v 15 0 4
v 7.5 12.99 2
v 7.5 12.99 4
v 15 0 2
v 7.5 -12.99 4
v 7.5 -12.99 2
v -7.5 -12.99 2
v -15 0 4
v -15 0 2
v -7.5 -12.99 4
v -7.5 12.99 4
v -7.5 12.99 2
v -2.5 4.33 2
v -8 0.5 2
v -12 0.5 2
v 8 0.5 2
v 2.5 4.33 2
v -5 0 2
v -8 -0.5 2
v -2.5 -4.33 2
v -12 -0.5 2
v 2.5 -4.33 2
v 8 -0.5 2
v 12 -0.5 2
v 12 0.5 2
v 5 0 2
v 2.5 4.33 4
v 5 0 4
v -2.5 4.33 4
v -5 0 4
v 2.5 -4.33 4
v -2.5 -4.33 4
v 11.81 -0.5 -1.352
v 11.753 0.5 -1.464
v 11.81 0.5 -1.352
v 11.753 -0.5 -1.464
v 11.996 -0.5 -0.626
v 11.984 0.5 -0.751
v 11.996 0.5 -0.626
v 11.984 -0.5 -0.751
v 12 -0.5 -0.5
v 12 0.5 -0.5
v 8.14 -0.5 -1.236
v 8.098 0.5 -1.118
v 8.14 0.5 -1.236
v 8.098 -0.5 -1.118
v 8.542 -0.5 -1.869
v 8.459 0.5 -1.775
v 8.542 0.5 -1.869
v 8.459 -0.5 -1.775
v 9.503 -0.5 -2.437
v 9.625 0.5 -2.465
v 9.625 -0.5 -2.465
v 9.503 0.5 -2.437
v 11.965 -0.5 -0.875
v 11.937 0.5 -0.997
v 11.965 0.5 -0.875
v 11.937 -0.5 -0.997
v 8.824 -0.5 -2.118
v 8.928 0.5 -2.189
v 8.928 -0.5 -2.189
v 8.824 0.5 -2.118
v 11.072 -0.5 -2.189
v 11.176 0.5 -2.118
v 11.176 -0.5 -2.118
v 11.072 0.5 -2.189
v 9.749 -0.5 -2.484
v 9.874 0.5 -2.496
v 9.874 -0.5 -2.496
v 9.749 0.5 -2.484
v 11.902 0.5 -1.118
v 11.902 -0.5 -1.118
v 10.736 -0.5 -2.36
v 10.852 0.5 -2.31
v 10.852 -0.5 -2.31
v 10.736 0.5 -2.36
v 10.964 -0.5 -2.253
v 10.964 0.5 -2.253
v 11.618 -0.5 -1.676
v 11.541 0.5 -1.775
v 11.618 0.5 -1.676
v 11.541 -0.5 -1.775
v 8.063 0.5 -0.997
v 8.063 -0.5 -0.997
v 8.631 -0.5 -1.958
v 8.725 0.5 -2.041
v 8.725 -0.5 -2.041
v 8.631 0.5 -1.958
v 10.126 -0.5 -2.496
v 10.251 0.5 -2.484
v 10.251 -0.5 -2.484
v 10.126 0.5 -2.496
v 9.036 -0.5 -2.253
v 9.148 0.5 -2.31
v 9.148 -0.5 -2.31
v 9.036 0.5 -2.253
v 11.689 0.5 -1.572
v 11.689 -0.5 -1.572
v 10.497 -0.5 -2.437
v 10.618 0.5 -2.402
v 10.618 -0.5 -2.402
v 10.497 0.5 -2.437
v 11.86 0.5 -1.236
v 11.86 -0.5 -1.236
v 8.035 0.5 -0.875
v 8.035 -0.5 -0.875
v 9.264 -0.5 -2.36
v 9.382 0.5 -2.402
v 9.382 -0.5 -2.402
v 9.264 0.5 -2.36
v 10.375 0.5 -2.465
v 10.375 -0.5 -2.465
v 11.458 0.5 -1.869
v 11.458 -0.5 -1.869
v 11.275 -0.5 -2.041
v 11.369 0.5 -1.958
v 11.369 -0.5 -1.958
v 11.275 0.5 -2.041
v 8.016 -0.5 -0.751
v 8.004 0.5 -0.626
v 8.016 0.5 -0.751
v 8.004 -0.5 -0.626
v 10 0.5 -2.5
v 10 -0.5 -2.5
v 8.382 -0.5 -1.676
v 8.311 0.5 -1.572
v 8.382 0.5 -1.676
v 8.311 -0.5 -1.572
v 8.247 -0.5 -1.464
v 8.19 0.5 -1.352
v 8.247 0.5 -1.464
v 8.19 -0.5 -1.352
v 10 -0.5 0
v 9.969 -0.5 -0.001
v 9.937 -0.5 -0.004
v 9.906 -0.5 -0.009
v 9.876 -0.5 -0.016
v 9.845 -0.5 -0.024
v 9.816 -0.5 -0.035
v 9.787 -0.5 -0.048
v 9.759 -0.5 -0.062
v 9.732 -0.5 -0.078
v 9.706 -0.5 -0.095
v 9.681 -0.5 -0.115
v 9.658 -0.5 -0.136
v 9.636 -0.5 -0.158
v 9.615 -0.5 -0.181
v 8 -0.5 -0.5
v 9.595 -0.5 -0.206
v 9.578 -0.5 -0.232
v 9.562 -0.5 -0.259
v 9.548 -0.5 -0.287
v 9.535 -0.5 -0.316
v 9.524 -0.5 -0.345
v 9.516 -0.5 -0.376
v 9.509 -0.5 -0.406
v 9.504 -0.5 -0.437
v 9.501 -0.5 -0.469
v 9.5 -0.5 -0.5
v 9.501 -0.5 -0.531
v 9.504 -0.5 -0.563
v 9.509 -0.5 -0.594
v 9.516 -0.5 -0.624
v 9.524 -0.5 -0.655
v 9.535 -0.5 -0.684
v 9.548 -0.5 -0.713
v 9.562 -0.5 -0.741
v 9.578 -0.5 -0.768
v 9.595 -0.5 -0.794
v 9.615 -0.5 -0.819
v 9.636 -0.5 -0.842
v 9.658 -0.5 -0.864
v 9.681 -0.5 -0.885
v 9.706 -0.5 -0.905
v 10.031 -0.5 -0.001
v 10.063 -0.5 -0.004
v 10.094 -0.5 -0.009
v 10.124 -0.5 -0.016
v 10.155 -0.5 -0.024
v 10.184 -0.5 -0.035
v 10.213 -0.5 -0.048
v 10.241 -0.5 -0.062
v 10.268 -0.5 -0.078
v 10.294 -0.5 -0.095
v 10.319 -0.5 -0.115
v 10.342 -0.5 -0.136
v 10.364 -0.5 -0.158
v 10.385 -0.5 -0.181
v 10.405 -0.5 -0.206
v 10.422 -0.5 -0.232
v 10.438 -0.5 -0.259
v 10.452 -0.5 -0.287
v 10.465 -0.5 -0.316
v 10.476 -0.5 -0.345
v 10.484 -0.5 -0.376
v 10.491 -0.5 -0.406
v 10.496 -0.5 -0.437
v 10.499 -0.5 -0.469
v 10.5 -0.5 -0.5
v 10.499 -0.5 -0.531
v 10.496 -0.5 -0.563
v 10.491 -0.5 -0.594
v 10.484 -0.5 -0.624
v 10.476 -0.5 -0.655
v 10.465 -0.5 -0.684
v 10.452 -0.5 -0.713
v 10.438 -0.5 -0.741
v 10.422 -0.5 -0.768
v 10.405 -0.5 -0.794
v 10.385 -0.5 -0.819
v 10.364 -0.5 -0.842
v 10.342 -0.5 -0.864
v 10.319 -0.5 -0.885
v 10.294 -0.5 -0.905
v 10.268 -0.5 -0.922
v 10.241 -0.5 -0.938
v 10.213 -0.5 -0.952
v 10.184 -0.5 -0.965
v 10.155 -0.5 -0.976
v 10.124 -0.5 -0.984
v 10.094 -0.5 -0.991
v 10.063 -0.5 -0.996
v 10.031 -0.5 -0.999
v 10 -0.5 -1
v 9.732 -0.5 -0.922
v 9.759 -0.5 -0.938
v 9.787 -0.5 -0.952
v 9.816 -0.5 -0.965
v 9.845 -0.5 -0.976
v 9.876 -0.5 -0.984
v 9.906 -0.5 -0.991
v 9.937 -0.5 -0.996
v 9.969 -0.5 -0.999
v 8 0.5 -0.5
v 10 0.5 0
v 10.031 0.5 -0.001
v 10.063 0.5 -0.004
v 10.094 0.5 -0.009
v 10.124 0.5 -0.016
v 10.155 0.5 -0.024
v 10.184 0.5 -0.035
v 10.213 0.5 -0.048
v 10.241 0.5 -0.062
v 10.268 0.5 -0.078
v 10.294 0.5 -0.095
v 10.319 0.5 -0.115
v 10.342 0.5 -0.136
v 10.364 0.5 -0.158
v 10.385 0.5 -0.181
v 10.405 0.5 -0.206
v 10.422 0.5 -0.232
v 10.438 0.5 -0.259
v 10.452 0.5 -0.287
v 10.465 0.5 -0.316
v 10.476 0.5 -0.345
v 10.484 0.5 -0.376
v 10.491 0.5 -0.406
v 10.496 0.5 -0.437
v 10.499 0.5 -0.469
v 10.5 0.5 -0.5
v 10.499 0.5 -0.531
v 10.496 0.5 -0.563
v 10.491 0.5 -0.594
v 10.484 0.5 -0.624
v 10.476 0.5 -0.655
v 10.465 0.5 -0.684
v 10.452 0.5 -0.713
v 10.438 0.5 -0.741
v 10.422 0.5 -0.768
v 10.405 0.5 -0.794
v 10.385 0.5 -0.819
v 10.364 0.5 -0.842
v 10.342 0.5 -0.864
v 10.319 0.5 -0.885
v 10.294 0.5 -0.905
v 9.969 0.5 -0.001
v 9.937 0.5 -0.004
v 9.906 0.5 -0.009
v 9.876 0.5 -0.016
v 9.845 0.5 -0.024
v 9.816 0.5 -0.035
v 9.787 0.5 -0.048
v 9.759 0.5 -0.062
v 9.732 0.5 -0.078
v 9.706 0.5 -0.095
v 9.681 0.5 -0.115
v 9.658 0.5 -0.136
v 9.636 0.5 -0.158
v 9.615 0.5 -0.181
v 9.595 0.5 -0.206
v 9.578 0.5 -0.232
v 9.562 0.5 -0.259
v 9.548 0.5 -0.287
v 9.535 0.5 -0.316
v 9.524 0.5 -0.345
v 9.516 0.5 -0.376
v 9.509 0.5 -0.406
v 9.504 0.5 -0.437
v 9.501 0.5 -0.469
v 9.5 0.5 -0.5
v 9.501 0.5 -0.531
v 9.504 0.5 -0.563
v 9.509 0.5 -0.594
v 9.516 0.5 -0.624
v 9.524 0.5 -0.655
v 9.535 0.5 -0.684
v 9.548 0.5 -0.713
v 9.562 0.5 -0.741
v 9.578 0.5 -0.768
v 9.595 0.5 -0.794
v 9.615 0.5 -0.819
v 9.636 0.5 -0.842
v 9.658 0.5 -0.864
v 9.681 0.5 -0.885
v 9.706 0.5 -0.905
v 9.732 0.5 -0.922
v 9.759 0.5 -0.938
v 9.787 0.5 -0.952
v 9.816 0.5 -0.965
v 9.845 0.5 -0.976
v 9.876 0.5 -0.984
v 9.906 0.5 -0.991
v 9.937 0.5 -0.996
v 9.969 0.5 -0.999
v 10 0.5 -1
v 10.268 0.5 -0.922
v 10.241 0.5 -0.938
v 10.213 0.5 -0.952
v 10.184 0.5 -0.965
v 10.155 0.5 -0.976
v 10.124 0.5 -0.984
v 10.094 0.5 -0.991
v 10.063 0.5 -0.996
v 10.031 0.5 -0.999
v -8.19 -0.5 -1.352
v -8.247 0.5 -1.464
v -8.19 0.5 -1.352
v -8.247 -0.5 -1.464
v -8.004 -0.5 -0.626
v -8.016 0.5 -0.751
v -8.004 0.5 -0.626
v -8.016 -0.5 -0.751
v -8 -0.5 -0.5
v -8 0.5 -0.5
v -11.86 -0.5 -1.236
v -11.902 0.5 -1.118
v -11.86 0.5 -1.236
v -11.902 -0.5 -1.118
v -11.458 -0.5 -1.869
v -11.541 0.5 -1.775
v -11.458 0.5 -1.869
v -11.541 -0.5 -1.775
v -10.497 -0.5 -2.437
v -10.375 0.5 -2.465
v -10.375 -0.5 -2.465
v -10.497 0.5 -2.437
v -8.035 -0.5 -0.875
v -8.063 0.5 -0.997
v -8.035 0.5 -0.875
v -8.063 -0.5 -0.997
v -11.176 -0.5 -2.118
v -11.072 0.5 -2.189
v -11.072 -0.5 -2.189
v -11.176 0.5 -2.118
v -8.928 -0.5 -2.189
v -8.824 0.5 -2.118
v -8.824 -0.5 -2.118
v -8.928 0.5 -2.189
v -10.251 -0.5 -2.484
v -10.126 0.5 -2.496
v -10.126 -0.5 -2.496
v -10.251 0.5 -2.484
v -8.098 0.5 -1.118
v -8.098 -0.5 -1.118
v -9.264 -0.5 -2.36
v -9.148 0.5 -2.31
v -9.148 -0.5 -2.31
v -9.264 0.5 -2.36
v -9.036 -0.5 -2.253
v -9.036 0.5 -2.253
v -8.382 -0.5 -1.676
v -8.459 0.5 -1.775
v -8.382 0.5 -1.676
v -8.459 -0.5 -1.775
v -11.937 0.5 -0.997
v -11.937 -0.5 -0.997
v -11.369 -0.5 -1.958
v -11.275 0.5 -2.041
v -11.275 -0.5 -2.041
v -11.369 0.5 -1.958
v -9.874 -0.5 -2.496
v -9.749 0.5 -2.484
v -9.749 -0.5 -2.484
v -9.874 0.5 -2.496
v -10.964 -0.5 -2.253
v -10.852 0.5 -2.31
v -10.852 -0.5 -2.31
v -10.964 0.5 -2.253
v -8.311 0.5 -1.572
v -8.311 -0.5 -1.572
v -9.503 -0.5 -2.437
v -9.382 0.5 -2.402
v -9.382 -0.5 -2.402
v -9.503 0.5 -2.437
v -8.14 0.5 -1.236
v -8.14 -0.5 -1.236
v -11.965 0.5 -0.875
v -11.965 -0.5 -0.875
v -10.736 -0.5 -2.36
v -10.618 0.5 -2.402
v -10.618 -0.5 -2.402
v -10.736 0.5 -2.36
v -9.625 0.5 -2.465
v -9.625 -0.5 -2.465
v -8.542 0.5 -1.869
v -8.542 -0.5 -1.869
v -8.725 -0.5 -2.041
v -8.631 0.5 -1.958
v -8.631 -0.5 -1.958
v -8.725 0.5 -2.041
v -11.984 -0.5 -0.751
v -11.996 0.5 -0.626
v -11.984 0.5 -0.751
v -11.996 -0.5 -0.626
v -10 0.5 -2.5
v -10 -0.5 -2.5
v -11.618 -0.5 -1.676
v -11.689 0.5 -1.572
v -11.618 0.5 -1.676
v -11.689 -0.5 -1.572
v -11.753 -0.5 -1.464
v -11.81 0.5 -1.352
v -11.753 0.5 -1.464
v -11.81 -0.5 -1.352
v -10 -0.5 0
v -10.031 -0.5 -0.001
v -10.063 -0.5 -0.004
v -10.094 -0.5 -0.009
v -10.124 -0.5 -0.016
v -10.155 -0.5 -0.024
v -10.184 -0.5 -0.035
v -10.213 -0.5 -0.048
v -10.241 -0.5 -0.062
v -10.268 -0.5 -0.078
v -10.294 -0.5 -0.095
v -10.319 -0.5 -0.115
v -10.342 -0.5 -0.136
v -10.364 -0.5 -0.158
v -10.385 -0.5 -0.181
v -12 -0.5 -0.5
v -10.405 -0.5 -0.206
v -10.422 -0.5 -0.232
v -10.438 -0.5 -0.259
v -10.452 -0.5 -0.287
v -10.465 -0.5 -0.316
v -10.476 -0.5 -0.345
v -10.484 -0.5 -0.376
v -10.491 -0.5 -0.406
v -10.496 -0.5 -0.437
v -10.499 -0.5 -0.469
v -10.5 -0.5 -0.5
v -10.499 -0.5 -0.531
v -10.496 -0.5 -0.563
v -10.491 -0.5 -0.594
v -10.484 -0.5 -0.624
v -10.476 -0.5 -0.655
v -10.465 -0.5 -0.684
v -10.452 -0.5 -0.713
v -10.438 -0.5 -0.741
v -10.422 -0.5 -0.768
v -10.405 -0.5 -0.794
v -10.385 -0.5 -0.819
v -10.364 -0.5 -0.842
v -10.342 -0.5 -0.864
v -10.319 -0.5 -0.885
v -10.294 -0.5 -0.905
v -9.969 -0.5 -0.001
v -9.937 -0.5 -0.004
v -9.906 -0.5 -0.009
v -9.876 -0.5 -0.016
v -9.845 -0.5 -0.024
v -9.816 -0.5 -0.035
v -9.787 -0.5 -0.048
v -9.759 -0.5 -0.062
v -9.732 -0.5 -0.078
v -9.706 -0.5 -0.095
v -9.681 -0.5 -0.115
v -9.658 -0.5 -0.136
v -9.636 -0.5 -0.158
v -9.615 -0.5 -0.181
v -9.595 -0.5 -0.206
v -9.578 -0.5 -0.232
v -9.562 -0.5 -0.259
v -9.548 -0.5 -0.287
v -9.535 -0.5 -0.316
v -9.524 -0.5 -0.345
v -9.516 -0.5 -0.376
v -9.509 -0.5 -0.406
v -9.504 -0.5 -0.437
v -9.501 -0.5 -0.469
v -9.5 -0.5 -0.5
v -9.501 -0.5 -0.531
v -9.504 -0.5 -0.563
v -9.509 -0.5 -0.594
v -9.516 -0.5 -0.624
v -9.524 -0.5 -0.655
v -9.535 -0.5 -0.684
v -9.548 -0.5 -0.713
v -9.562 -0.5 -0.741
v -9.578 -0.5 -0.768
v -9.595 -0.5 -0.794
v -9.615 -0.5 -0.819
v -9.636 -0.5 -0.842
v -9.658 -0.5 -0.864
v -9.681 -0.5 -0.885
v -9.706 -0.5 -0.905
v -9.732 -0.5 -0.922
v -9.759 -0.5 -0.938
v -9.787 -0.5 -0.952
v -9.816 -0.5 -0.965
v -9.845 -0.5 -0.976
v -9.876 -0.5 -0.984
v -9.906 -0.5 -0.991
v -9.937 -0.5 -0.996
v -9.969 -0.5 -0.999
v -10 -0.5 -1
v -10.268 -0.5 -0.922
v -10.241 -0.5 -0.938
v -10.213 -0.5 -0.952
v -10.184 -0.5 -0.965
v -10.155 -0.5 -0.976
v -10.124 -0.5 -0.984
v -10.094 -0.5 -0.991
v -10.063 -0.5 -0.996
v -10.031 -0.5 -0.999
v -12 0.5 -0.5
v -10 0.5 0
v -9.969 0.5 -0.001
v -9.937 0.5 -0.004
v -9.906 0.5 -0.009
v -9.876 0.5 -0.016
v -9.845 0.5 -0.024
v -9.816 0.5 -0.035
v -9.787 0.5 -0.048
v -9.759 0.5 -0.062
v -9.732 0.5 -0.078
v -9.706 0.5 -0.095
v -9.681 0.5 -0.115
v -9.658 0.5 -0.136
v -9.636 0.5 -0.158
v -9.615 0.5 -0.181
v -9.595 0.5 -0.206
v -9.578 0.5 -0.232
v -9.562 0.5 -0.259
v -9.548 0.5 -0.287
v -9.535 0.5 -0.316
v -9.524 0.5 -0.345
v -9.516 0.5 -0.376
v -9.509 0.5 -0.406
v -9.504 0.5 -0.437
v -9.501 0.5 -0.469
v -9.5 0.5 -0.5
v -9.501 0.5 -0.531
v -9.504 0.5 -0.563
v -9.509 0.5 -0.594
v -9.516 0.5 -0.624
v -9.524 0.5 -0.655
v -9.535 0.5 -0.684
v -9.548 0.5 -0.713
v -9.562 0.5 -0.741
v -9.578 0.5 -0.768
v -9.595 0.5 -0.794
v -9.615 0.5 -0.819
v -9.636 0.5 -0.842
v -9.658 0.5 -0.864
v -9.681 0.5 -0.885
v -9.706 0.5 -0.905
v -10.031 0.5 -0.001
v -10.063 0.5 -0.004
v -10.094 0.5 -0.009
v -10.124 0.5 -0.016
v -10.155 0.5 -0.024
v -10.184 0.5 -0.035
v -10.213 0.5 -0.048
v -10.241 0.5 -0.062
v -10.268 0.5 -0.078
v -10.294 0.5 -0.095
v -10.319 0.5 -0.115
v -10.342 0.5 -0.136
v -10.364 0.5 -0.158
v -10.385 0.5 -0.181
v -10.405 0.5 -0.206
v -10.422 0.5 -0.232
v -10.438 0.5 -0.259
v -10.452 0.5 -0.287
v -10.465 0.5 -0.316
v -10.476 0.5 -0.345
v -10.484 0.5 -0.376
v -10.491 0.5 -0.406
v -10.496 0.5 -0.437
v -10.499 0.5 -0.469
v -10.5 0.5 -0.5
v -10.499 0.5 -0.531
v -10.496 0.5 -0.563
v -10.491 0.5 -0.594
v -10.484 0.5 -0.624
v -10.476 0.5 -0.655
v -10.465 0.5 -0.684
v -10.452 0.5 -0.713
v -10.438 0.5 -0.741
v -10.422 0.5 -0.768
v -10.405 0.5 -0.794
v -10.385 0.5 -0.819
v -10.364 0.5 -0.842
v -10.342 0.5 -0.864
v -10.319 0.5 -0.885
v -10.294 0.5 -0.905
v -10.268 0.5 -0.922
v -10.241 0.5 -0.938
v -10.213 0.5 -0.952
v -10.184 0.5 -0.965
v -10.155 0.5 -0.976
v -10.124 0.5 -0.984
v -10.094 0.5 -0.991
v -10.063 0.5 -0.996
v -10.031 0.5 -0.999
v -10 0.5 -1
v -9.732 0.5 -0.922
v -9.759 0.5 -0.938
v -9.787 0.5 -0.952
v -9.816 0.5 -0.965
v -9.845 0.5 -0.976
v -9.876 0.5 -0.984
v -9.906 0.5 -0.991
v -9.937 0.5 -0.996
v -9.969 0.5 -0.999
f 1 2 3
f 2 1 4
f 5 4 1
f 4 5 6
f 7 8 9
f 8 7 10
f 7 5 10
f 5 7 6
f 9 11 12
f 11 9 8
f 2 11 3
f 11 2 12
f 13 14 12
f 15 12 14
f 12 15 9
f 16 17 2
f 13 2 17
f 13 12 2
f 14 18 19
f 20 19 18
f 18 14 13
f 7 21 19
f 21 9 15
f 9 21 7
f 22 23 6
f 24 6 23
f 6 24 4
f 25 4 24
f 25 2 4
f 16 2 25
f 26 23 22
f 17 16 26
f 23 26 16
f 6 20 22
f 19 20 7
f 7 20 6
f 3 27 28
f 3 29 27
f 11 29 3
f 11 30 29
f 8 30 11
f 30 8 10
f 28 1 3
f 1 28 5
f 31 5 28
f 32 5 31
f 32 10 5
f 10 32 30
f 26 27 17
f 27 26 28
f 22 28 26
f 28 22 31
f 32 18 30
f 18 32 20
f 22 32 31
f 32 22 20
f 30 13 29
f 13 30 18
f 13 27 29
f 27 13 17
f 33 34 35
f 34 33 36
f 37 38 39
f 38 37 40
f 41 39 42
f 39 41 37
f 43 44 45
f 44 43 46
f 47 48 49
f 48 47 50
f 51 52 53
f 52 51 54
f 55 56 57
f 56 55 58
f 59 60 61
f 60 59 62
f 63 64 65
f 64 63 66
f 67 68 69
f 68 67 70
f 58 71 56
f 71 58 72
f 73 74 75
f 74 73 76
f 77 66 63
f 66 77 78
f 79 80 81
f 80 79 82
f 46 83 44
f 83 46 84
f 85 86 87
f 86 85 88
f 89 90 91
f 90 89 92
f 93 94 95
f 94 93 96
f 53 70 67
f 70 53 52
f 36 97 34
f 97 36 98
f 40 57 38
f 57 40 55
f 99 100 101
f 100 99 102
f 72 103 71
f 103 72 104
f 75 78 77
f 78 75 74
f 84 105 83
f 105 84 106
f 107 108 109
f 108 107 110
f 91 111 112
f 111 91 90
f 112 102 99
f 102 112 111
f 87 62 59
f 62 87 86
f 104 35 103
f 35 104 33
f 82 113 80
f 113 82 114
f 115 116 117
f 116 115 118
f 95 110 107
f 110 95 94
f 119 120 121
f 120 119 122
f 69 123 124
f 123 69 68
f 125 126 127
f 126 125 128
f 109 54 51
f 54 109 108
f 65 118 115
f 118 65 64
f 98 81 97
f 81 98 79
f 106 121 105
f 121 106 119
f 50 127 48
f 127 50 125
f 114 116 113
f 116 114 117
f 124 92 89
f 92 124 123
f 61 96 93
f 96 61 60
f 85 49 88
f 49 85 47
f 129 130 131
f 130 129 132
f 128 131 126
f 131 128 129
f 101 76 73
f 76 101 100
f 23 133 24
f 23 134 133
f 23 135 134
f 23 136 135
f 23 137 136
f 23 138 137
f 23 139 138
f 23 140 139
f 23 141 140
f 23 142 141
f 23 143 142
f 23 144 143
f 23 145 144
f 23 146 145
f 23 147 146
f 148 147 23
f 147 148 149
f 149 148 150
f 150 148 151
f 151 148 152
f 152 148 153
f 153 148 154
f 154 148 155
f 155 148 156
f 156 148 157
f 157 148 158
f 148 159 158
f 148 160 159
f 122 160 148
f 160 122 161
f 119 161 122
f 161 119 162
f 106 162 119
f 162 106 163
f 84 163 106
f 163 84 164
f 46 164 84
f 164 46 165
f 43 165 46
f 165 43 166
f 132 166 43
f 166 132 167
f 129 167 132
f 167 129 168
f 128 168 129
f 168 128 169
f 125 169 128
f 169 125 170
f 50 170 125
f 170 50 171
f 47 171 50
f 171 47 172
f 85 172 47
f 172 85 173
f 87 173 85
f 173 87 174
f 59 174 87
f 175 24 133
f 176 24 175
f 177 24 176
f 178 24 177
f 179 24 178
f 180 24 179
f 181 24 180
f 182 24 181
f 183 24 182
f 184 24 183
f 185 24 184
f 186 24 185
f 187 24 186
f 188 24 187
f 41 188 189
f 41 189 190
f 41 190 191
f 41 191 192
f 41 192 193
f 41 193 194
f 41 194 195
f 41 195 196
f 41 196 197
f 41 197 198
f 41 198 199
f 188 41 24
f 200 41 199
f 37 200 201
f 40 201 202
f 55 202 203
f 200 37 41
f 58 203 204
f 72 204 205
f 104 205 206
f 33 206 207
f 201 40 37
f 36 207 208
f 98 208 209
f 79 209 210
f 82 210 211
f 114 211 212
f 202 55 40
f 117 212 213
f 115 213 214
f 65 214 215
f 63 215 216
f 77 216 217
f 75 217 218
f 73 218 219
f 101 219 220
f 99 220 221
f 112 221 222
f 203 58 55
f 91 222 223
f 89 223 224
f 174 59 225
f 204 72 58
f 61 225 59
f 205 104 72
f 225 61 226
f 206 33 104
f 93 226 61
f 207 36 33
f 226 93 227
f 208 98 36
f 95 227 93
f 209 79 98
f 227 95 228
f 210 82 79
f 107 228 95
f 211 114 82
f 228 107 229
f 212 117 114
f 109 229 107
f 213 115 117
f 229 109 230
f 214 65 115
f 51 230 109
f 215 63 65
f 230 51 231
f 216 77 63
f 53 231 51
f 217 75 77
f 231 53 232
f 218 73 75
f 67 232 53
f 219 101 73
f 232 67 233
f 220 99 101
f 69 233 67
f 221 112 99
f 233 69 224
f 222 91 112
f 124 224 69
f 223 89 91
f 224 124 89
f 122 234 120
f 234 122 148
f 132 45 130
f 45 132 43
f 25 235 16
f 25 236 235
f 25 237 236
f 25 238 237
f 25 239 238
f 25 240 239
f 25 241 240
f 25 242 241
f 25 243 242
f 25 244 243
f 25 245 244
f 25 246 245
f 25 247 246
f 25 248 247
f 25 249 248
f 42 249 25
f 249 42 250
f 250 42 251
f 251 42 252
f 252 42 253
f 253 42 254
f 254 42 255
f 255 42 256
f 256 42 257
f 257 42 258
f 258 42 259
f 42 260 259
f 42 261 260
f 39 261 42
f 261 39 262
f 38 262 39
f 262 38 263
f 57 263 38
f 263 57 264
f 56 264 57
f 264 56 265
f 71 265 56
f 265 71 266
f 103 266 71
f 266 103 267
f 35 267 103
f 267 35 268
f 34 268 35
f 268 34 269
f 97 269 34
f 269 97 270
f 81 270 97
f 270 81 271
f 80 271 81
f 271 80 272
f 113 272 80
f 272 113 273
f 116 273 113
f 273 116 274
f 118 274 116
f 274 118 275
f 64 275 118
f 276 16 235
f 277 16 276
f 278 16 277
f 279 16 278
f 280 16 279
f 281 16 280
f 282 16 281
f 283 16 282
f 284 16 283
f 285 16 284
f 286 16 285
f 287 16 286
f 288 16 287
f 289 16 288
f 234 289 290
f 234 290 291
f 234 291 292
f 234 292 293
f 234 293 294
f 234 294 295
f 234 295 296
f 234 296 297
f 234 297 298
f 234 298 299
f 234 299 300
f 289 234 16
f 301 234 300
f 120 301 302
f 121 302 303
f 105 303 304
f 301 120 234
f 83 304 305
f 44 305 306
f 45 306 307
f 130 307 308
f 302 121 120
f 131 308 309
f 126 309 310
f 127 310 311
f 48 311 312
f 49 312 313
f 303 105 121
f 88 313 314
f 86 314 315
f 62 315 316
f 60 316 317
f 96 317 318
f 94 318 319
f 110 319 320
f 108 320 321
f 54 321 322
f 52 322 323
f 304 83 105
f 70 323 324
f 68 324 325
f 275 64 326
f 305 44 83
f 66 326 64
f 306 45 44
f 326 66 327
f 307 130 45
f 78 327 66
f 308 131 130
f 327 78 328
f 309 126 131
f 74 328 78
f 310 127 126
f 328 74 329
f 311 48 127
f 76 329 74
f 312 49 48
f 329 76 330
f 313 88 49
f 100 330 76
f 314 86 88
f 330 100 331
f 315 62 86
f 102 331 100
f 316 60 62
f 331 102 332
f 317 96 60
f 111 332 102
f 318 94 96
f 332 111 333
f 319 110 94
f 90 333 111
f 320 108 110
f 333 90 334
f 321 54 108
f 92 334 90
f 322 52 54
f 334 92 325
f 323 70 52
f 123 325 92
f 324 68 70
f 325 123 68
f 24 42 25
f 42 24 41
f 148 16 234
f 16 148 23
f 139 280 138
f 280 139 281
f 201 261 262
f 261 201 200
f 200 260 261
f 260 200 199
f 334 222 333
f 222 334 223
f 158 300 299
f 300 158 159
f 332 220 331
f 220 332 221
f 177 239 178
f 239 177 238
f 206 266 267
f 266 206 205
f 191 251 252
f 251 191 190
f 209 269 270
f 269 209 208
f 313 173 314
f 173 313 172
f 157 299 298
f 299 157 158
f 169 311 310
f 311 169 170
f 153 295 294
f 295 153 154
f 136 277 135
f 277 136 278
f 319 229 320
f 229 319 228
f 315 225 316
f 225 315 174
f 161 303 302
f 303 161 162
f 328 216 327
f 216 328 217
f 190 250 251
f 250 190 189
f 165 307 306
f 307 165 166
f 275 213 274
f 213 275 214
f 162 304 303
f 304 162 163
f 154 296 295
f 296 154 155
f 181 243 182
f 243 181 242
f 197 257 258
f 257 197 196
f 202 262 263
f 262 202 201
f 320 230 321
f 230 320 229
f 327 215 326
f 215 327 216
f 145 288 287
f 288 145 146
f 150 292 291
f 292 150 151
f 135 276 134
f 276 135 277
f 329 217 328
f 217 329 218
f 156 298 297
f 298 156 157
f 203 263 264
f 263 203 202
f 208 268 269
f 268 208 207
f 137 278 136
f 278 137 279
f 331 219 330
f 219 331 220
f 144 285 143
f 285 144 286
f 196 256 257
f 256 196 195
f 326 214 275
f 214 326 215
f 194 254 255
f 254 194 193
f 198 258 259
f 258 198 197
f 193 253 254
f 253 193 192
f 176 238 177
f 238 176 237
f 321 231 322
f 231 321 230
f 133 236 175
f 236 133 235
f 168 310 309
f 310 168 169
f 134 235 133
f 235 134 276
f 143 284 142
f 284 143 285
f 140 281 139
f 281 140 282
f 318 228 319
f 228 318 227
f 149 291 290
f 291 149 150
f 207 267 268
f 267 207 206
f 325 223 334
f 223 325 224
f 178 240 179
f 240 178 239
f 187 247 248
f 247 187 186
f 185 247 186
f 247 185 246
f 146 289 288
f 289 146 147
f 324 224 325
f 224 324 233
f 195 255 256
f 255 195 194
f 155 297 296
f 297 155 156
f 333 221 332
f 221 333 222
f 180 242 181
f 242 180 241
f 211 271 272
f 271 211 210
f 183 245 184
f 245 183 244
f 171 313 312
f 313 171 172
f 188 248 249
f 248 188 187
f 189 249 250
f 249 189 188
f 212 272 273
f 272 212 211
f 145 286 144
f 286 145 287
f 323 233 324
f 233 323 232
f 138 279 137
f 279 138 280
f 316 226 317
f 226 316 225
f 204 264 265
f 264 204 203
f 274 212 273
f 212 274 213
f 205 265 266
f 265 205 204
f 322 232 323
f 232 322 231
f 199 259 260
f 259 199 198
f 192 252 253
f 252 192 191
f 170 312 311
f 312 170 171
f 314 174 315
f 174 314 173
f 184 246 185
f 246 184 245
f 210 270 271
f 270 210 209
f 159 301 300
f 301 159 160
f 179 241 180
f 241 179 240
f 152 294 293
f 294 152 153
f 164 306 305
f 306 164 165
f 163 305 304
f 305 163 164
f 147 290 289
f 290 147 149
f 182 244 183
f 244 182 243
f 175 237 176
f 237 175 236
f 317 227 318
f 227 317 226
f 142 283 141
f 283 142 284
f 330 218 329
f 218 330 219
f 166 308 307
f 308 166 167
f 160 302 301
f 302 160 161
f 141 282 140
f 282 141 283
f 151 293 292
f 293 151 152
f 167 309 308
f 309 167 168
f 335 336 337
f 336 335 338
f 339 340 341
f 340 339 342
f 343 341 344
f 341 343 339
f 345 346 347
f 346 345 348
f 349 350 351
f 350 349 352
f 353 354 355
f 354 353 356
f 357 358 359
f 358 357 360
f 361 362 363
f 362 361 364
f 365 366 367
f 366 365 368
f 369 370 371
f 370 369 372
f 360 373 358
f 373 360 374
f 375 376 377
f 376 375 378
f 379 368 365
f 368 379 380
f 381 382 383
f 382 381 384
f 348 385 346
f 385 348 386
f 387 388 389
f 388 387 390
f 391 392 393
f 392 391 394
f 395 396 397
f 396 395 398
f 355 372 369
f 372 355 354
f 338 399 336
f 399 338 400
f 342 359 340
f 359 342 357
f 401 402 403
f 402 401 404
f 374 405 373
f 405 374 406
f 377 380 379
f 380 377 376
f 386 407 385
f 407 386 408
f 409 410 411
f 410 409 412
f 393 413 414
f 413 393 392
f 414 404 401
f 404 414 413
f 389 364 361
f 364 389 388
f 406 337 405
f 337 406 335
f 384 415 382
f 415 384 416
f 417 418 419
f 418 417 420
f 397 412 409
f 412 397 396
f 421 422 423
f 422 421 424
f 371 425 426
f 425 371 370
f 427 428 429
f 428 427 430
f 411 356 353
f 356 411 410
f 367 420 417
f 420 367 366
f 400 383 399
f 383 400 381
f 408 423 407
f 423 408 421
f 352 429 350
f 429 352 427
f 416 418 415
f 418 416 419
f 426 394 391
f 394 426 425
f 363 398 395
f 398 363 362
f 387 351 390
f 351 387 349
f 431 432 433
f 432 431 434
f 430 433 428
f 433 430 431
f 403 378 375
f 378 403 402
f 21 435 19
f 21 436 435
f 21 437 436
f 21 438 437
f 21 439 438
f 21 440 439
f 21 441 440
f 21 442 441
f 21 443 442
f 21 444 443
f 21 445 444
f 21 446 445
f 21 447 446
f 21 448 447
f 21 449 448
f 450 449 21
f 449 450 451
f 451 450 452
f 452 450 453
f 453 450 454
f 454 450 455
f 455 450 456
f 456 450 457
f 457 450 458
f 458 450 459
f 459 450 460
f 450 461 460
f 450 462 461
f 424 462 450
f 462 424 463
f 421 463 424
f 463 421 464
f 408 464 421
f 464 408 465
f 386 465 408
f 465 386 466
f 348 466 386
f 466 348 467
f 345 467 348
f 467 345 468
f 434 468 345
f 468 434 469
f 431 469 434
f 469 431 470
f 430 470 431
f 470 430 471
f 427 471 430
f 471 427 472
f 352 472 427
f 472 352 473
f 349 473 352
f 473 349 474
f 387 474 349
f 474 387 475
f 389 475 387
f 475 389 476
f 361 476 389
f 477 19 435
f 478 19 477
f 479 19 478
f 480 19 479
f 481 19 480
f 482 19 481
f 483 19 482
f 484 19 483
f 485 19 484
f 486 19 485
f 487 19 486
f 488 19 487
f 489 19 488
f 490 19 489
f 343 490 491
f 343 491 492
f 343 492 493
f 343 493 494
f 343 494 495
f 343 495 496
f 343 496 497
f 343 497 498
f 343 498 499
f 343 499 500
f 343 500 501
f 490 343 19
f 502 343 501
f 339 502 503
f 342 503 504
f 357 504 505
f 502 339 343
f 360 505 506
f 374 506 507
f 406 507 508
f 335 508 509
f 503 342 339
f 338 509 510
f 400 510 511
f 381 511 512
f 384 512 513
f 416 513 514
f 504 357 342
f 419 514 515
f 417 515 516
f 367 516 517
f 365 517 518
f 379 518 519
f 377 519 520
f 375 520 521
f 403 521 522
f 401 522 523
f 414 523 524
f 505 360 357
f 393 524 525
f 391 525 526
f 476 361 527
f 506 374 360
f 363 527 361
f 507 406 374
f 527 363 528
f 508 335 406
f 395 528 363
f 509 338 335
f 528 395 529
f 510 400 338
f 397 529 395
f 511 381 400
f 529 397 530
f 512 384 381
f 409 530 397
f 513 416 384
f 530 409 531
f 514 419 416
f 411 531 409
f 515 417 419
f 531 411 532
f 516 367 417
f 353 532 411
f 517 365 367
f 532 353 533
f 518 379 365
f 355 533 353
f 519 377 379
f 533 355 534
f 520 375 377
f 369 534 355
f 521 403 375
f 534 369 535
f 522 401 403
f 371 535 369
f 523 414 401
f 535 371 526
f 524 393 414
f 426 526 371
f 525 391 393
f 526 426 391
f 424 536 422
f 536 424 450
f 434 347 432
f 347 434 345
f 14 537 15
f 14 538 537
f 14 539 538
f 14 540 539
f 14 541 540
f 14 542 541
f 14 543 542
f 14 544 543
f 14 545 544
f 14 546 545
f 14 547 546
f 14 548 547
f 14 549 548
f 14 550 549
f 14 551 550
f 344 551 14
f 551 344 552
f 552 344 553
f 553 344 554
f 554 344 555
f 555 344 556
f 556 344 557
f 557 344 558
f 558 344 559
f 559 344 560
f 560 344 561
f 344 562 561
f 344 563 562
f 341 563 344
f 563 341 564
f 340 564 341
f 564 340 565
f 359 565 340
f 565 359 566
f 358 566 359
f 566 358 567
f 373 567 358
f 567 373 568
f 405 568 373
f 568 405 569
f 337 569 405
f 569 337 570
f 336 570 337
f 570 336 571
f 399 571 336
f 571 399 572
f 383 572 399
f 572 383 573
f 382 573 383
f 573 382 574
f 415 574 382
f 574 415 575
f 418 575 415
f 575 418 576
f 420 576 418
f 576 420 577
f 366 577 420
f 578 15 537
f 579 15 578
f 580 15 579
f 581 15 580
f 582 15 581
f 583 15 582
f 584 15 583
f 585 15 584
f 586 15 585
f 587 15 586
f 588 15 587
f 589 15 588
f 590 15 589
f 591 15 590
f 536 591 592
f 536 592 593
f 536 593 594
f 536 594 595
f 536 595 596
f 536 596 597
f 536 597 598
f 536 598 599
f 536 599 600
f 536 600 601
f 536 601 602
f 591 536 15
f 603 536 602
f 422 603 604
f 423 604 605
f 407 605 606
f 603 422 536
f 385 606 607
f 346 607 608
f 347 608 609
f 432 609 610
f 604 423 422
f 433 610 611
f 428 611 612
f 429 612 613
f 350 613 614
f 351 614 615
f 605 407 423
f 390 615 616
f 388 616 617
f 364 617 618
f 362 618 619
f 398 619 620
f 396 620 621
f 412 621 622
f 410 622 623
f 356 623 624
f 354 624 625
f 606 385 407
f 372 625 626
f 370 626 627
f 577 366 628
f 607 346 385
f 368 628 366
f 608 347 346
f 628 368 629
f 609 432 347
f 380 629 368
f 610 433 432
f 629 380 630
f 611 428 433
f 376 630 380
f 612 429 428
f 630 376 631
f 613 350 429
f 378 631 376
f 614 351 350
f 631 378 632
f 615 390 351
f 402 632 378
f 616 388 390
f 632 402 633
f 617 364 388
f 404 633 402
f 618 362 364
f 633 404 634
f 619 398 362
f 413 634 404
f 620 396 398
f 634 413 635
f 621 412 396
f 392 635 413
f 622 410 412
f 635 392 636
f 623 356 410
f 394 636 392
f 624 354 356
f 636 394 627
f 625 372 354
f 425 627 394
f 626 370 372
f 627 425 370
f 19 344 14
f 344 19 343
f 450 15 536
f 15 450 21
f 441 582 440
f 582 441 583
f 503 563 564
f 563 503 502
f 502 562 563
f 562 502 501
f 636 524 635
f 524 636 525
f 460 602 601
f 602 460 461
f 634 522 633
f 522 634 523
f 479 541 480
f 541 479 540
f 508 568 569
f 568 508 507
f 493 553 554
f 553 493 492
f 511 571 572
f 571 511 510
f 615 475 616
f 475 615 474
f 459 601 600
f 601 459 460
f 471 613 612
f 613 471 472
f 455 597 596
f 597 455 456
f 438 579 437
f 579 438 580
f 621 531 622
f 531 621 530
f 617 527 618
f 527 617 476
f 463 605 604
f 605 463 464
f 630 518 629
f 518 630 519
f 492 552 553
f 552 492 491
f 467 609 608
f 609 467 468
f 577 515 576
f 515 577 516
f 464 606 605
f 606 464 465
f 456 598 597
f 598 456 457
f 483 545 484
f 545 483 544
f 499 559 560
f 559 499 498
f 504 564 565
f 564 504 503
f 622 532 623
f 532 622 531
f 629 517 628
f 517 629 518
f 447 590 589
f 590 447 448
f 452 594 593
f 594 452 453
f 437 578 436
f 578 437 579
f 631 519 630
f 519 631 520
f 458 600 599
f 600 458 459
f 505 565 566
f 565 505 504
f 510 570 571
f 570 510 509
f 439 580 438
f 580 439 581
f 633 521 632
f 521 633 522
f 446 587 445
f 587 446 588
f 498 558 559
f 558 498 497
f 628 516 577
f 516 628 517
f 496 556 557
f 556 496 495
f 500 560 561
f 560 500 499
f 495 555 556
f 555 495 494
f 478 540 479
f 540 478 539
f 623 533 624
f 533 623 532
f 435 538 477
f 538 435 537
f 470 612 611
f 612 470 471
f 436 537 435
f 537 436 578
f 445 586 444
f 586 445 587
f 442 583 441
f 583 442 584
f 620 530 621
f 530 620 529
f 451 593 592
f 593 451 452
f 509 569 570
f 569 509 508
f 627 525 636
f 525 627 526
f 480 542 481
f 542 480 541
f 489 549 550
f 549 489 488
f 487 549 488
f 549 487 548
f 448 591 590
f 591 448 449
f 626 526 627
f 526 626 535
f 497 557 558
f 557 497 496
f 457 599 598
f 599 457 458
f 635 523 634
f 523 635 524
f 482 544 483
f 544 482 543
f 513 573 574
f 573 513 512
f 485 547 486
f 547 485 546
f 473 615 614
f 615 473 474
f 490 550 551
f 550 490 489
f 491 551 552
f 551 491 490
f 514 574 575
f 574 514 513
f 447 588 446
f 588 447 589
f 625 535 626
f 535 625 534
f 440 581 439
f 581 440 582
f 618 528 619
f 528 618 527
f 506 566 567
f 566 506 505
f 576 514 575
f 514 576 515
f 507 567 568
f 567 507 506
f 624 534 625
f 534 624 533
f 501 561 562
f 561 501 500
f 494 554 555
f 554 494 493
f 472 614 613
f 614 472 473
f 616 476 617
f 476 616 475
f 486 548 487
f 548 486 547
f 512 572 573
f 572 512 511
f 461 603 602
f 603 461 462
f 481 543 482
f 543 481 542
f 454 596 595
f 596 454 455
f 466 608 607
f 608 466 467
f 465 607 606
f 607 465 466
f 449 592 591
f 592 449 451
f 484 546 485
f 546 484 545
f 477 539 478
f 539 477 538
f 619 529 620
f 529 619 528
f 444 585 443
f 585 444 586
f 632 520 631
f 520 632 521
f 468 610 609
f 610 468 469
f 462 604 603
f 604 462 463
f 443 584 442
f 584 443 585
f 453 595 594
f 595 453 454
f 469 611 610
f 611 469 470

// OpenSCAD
// Copyright (C) 2026 Robert L. Read
// This program is free software: you can redistribute it and/or 
// modify it under the terms of the GNU Affero General Public 
// License as published by the Free Software Foundation, version 3. 
// This program is distributed in the hope that it will be useful, 
// but WITHOUT ANY WARRANTY; without even the implied warranty of 
// MERCHANTABILITY or FITNESS FOR A PARTICULAR PURPOSE. See the GNU 
// Affero General Public License for more details. You should have
// received a copy of the GNU Affero General Public License along
// with this program. If not, see <https://www.gnu.org/licenses/>.

// Basic Badge Parameters
S_mm = 15; // side of the hexagon
Base_thickness_mm = 2;
Clevis_lug_hole_mm = 1;
Clevis_lug_diameter_mm = 4;
Clevis_lug_thickness_mm = 1;
Clevis_fork_extra_gap_mm = 0.2;
Clevis_lug_added_length_mm = Base_thickness_mm; // Length from bottom of hole to flat base

// Rendering Choice
render_base = 0;
render_holder_unit = 0;

render_pubinv_badge = 1;


// Holder parameters


// Begin code

// Male Clevis Lug (bottom of hole at z = 0)
module MaleClevisLug(add_mm) {
    m = max(add_mm,(Clevis_lug_diameter_mm-Clevis_lug_hole_mm)/2);
    union() {
        translate([0,0, 
        (add_mm + Clevis_lug_hole_mm/2)])
        difference() {
            union() {
                rotate([90,0,0]) 
                cylinder(r=Clevis_lug_diameter_mm/2, 
                    h=Clevis_lug_thickness_mm, $fn=100, center=true);
                translate([0,0,-(m + Clevis_lug_hole_mm/2)/2])
                cube([Clevis_lug_diameter_mm,
                    Clevis_lug_thickness_mm,    
                    m+Clevis_lug_hole_mm/2],center=true); 
            }
            rotate([90,0,0]) 
            cylinder(r=Clevis_lug_hole_mm/2, h=Clevis_lug_thickness_mm*3, $fn=100, center=true); 
        }              
    }
}
// This places the bottom of the whole at z = 0
module FemaleClevisFork() {
    translate([0,Clevis_lug_thickness_mm + Clevis_fork_extra_gap_mm/2,0])
    MaleClevisLug(0);
    translate([0,-(Clevis_lug_thickness_mm+ Clevis_fork_extra_gap_mm/2),0])
    MaleClevisLug(0);    
}

module BasePlate() {
    rotate([0,0,60])
    difference() {
        cylinder(r=S_mm, h=Base_thickness_mm, $fn=6,center=true);
        // Now cut the center hole
        cylinder(h=Base_thickness_mm*3, r=S_mm/3, center = true, $fn=6
        );        
    }
}

module Base() {
    rotate([180,0,0])
    union() {
    BasePlate();
    // Add male Clevis lugs
    d = S_mm*(2/3);
    z = Base_thickness_mm/2;
    translate([d,0,z])
        MaleClevisLug(Clevis_lug_added_length_mm);
    translate([-d,0,z])
        MaleClevisLug(Clevis_lug_added_length_mm);
      }  
}


module HolderUnit() {
    rotate([180,0,0])
    union() {
        // Add female Clevis forks
        d = S_mm*(2/3);
        z = Base_thickness_mm/2;
        translate([d,0,z])
            FemaleClevisFork();
        translate([-d,0,z])
            FemaleClevisFork(); 
        difference() {
            BasePlate();
            translate([d,0,z])
            cube([Clevis_lug_diameter_mm+ Clevis_fork_extra_gap_mm,
                Clevis_lug_thickness_mm + Clevis_fork_extra_gap_mm,       
                Base_thickness_mm*3],center=true);
            translate([-d,0,z])
            cube([Clevis_lug_diameter_mm+ Clevis_fork_extra_gap_mm,
                Clevis_lug_thickness_mm + Clevis_fork_extra_gap_mm,       
                Base_thickness_mm*3],center=true);
        }   
    }
}

// Begin rendering
if (render_base) {
   translate([0,0,Base_thickness_mm+1])
   Base();
}

if (render_holder_unit) {
    HolderUnit();
}
// badges
module BadgeTrim() {
   cylinder(r=S_mm, h=Base_thickness_mm*20, $fn=6,center=true);
}
module PubInvBadge() {
    intersection() {
        s = 0.02;
        rotate([0,0,90])
        translate([0,0,1])
        scale([s,s,s])
        scale([1, 1, 0.8]) {
            surface(file = "LogoPubInv_4x_TouchUp_TwoColor.png", center = true, invert = false);
        }
        BadgeTrim();
    }
    Base();
}

if (render_pubinv_badge) {
    translate([0,0,Base_thickness_mm+1])
    PubInvBadge();  
}

//MaleClevisLug(0);
//FemaleClevisFork();
